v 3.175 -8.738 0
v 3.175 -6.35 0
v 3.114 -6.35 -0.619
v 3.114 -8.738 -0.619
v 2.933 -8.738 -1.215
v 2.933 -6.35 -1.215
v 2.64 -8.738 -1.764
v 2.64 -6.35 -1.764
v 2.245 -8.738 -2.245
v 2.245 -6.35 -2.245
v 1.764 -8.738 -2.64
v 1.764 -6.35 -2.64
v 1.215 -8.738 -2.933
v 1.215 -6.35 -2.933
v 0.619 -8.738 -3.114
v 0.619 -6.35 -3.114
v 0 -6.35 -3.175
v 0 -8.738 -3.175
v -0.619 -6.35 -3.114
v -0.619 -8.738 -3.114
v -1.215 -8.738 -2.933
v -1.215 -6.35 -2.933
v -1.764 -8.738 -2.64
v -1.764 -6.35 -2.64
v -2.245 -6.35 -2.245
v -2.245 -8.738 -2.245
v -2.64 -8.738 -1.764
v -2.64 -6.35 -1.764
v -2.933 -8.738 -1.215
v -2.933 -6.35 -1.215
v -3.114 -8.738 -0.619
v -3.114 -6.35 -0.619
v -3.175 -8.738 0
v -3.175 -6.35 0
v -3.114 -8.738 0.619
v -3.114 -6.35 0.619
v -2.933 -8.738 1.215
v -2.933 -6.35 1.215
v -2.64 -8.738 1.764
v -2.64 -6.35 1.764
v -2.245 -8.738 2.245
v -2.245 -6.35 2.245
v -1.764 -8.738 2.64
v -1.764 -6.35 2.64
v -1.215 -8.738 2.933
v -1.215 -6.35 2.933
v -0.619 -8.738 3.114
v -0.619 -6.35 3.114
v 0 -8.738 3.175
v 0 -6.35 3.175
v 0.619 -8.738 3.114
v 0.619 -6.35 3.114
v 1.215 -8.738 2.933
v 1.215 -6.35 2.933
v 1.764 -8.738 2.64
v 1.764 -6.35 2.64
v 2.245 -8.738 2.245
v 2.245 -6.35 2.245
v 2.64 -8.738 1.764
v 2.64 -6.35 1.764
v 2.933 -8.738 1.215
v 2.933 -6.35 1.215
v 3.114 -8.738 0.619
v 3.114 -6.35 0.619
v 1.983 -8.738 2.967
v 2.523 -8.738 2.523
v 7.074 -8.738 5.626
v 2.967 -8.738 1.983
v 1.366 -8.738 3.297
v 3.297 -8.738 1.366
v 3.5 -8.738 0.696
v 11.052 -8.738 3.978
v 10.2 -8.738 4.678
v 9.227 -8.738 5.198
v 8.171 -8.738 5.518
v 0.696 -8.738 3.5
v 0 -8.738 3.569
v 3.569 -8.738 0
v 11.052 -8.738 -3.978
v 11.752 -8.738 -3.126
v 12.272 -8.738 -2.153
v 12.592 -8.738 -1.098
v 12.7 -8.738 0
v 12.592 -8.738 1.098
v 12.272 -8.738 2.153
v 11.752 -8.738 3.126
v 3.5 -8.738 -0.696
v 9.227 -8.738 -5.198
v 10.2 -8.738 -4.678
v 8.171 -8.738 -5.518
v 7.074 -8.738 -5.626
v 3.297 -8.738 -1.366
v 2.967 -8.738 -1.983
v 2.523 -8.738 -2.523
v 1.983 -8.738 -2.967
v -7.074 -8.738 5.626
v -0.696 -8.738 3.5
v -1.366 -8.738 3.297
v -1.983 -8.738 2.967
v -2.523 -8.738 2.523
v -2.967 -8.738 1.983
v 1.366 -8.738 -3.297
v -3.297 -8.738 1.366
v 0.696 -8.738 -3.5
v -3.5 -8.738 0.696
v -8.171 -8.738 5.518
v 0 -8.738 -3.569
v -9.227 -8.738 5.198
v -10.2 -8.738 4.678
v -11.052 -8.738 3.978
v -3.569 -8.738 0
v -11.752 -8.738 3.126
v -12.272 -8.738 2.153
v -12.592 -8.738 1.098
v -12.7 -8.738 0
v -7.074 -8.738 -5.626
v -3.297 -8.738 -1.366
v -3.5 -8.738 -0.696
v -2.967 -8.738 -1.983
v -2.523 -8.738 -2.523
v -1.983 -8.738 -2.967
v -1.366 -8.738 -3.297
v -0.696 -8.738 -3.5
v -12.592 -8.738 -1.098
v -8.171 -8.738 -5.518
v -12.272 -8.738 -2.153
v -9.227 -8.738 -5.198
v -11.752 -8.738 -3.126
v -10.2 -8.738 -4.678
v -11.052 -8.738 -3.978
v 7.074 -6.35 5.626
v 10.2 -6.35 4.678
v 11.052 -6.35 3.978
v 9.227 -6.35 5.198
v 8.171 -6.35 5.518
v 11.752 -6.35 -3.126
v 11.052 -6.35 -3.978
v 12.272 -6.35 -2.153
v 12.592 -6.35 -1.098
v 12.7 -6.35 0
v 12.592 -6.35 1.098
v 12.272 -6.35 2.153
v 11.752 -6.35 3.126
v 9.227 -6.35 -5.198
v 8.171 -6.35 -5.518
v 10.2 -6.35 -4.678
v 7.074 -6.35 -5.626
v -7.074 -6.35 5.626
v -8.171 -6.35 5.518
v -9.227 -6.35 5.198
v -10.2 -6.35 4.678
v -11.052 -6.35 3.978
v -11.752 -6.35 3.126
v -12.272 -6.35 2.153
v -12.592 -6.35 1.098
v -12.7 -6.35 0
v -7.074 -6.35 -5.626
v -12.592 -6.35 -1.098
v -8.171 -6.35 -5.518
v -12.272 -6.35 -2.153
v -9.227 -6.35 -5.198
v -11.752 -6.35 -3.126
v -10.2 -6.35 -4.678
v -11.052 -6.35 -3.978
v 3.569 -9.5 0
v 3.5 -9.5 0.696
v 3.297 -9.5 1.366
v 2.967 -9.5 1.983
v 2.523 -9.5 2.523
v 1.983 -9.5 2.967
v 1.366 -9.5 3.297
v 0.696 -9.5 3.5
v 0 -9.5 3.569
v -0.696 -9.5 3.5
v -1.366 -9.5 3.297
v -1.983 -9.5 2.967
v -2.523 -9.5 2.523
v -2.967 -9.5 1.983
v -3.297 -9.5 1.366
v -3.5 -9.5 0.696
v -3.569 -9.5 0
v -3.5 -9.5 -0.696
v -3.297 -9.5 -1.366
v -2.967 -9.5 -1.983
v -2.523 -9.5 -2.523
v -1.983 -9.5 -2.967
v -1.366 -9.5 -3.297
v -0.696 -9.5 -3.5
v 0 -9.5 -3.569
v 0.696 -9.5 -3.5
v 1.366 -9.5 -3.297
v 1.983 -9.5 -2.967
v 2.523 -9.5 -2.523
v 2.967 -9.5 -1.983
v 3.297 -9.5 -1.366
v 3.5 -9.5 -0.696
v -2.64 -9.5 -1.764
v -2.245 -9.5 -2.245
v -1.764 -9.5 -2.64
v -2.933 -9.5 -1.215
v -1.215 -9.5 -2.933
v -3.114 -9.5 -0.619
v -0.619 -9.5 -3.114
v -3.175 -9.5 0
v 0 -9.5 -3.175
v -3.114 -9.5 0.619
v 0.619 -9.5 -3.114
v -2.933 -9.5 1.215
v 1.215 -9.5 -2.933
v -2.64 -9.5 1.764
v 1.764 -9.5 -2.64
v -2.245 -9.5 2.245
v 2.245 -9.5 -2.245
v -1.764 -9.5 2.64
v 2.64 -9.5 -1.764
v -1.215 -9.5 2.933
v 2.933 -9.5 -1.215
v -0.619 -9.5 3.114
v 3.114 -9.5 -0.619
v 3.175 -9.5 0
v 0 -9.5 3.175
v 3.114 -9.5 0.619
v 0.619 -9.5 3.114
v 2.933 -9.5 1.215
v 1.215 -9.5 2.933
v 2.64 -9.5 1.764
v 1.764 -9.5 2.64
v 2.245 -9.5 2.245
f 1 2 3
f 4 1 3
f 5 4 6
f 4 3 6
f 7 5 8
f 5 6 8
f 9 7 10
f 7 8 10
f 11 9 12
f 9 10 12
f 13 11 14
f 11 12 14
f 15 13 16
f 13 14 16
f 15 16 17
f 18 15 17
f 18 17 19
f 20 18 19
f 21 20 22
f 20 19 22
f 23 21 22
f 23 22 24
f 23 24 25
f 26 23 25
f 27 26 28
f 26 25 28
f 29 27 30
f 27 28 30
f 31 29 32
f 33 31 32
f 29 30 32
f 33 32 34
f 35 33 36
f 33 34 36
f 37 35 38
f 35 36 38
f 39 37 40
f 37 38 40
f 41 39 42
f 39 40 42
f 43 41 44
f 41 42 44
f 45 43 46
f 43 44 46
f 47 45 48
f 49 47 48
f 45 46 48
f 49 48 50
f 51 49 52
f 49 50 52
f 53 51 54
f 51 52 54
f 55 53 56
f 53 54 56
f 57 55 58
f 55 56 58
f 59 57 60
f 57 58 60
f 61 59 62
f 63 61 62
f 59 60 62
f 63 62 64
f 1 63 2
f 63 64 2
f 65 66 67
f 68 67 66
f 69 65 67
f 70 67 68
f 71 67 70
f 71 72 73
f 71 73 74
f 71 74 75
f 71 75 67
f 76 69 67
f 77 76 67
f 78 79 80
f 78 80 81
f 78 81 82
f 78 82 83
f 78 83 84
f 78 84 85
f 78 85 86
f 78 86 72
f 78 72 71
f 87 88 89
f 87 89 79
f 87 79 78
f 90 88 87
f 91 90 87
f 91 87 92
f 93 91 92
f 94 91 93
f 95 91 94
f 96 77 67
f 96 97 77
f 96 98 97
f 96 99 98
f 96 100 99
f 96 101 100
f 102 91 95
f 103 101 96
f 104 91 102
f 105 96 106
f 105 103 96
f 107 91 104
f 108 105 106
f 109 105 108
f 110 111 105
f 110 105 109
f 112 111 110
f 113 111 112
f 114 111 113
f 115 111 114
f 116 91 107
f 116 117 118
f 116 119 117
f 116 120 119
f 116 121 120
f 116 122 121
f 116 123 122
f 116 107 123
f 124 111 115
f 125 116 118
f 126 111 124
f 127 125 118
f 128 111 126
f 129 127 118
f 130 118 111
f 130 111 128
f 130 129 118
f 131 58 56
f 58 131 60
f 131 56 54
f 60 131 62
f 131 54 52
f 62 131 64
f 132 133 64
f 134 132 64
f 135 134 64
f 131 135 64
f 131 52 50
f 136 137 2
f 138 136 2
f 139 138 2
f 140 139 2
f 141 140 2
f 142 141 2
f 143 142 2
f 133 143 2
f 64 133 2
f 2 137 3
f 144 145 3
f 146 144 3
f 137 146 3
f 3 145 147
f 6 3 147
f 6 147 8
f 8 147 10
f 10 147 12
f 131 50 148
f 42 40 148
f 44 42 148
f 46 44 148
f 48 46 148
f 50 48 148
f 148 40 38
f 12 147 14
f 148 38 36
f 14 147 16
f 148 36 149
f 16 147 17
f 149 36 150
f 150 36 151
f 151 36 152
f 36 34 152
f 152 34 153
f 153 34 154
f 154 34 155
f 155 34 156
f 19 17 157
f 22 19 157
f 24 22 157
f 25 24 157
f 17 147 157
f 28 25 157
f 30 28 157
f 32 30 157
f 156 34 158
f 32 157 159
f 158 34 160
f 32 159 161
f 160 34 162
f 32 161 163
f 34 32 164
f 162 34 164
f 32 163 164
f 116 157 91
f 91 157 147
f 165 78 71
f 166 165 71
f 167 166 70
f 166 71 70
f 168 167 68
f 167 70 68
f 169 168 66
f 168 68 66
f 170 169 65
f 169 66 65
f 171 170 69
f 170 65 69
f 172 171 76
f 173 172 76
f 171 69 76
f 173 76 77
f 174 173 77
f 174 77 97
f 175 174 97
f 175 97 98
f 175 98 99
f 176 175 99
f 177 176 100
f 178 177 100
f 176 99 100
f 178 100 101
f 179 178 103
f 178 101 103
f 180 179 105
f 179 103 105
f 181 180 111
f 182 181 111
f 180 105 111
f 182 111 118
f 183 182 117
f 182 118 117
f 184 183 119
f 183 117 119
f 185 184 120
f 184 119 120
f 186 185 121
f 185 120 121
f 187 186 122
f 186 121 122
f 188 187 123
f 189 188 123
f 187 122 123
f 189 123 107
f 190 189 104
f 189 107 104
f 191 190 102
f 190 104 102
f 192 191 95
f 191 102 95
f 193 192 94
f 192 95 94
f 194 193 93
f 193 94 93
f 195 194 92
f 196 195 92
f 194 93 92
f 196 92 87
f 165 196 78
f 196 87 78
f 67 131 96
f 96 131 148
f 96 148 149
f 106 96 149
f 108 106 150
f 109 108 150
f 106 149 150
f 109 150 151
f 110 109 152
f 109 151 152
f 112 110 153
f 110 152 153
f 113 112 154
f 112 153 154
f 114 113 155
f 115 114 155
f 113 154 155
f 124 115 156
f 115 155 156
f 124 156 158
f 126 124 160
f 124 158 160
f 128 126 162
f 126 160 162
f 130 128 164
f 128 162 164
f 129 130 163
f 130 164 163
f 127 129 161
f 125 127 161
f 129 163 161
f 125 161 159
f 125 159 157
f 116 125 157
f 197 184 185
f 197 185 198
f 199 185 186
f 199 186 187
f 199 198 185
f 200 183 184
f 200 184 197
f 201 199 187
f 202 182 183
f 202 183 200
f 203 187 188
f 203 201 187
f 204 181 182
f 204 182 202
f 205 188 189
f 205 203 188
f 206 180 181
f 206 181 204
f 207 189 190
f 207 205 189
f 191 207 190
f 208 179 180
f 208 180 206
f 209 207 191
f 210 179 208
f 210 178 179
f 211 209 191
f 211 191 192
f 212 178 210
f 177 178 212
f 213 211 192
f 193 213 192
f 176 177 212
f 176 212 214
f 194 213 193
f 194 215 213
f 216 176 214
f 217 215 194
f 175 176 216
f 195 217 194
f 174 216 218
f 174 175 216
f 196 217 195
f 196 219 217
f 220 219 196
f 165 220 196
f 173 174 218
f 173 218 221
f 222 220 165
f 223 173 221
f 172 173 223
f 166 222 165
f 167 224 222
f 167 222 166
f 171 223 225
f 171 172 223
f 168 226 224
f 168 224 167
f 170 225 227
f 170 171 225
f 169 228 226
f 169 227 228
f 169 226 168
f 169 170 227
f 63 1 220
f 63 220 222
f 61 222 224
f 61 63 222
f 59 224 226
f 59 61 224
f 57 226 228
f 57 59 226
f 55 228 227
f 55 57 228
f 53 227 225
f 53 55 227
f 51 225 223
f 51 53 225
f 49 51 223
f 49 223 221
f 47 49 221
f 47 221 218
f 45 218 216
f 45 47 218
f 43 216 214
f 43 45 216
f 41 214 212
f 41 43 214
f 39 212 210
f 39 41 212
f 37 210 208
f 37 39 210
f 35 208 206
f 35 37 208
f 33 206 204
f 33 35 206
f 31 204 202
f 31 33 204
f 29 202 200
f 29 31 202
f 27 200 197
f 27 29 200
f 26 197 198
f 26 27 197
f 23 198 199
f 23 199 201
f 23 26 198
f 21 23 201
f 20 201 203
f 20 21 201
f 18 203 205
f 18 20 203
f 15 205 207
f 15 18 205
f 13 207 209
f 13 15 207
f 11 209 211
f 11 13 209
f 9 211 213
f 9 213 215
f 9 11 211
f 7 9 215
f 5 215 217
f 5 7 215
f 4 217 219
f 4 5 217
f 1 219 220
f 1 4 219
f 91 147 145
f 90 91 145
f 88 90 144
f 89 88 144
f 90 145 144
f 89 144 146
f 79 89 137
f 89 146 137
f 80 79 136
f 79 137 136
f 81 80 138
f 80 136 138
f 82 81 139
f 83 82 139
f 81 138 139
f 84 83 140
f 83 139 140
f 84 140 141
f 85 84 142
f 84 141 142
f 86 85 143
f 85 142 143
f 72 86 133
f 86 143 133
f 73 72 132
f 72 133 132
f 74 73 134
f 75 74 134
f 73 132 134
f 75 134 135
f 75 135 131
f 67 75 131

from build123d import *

# Parameters (mm, degrees)
BOSS_EXTRUDE2_START = -6.35
SKETCH8_R           = 3.175
BOSS_EXTRUDE2_DEPTH = 2.3876
SKETCH9_R           = 3.5687
SKETCH9_R_2         = 3.175
BOSS_EXTRUDE3_DEPTH = 0.762


with BuildPart() as part:
    # Sketch8 → Boss-Extrude2 (new body)
    with BuildSketch(Plane(origin=(0, 0, 0), x_dir=(1, 0, 0), z_dir=(0, 1, 0)).offset(BOSS_EXTRUDE2_START)):
        with BuildLine():
            Line((-7.0739, 5.6261), (7.0739, 5.6261))
            ThreePointArc((7.0739, 5.6261), (12.7, 0), (7.0739, -5.6261))
            Line((7.0739, -5.6261), (-7.0739, -5.6261))
            ThreePointArc((-7.0739, -5.6261), (-12.7, 0), (-7.0739, 5.6261))
        make_face()
        Circle(SKETCH8_R, mode=Mode.SUBTRACT)
    extrude(amount=-BOSS_EXTRUDE2_DEPTH)

    # Sketch9 → Boss-Extrude3 (add)
    with BuildSketch(Plane.XZ.offset(8.7376)):
        Circle(SKETCH9_R)
        Circle(SKETCH9_R_2, mode=Mode.SUBTRACT)
    extrude(amount=BOSS_EXTRUDE3_DEPTH)


solid = part.part
